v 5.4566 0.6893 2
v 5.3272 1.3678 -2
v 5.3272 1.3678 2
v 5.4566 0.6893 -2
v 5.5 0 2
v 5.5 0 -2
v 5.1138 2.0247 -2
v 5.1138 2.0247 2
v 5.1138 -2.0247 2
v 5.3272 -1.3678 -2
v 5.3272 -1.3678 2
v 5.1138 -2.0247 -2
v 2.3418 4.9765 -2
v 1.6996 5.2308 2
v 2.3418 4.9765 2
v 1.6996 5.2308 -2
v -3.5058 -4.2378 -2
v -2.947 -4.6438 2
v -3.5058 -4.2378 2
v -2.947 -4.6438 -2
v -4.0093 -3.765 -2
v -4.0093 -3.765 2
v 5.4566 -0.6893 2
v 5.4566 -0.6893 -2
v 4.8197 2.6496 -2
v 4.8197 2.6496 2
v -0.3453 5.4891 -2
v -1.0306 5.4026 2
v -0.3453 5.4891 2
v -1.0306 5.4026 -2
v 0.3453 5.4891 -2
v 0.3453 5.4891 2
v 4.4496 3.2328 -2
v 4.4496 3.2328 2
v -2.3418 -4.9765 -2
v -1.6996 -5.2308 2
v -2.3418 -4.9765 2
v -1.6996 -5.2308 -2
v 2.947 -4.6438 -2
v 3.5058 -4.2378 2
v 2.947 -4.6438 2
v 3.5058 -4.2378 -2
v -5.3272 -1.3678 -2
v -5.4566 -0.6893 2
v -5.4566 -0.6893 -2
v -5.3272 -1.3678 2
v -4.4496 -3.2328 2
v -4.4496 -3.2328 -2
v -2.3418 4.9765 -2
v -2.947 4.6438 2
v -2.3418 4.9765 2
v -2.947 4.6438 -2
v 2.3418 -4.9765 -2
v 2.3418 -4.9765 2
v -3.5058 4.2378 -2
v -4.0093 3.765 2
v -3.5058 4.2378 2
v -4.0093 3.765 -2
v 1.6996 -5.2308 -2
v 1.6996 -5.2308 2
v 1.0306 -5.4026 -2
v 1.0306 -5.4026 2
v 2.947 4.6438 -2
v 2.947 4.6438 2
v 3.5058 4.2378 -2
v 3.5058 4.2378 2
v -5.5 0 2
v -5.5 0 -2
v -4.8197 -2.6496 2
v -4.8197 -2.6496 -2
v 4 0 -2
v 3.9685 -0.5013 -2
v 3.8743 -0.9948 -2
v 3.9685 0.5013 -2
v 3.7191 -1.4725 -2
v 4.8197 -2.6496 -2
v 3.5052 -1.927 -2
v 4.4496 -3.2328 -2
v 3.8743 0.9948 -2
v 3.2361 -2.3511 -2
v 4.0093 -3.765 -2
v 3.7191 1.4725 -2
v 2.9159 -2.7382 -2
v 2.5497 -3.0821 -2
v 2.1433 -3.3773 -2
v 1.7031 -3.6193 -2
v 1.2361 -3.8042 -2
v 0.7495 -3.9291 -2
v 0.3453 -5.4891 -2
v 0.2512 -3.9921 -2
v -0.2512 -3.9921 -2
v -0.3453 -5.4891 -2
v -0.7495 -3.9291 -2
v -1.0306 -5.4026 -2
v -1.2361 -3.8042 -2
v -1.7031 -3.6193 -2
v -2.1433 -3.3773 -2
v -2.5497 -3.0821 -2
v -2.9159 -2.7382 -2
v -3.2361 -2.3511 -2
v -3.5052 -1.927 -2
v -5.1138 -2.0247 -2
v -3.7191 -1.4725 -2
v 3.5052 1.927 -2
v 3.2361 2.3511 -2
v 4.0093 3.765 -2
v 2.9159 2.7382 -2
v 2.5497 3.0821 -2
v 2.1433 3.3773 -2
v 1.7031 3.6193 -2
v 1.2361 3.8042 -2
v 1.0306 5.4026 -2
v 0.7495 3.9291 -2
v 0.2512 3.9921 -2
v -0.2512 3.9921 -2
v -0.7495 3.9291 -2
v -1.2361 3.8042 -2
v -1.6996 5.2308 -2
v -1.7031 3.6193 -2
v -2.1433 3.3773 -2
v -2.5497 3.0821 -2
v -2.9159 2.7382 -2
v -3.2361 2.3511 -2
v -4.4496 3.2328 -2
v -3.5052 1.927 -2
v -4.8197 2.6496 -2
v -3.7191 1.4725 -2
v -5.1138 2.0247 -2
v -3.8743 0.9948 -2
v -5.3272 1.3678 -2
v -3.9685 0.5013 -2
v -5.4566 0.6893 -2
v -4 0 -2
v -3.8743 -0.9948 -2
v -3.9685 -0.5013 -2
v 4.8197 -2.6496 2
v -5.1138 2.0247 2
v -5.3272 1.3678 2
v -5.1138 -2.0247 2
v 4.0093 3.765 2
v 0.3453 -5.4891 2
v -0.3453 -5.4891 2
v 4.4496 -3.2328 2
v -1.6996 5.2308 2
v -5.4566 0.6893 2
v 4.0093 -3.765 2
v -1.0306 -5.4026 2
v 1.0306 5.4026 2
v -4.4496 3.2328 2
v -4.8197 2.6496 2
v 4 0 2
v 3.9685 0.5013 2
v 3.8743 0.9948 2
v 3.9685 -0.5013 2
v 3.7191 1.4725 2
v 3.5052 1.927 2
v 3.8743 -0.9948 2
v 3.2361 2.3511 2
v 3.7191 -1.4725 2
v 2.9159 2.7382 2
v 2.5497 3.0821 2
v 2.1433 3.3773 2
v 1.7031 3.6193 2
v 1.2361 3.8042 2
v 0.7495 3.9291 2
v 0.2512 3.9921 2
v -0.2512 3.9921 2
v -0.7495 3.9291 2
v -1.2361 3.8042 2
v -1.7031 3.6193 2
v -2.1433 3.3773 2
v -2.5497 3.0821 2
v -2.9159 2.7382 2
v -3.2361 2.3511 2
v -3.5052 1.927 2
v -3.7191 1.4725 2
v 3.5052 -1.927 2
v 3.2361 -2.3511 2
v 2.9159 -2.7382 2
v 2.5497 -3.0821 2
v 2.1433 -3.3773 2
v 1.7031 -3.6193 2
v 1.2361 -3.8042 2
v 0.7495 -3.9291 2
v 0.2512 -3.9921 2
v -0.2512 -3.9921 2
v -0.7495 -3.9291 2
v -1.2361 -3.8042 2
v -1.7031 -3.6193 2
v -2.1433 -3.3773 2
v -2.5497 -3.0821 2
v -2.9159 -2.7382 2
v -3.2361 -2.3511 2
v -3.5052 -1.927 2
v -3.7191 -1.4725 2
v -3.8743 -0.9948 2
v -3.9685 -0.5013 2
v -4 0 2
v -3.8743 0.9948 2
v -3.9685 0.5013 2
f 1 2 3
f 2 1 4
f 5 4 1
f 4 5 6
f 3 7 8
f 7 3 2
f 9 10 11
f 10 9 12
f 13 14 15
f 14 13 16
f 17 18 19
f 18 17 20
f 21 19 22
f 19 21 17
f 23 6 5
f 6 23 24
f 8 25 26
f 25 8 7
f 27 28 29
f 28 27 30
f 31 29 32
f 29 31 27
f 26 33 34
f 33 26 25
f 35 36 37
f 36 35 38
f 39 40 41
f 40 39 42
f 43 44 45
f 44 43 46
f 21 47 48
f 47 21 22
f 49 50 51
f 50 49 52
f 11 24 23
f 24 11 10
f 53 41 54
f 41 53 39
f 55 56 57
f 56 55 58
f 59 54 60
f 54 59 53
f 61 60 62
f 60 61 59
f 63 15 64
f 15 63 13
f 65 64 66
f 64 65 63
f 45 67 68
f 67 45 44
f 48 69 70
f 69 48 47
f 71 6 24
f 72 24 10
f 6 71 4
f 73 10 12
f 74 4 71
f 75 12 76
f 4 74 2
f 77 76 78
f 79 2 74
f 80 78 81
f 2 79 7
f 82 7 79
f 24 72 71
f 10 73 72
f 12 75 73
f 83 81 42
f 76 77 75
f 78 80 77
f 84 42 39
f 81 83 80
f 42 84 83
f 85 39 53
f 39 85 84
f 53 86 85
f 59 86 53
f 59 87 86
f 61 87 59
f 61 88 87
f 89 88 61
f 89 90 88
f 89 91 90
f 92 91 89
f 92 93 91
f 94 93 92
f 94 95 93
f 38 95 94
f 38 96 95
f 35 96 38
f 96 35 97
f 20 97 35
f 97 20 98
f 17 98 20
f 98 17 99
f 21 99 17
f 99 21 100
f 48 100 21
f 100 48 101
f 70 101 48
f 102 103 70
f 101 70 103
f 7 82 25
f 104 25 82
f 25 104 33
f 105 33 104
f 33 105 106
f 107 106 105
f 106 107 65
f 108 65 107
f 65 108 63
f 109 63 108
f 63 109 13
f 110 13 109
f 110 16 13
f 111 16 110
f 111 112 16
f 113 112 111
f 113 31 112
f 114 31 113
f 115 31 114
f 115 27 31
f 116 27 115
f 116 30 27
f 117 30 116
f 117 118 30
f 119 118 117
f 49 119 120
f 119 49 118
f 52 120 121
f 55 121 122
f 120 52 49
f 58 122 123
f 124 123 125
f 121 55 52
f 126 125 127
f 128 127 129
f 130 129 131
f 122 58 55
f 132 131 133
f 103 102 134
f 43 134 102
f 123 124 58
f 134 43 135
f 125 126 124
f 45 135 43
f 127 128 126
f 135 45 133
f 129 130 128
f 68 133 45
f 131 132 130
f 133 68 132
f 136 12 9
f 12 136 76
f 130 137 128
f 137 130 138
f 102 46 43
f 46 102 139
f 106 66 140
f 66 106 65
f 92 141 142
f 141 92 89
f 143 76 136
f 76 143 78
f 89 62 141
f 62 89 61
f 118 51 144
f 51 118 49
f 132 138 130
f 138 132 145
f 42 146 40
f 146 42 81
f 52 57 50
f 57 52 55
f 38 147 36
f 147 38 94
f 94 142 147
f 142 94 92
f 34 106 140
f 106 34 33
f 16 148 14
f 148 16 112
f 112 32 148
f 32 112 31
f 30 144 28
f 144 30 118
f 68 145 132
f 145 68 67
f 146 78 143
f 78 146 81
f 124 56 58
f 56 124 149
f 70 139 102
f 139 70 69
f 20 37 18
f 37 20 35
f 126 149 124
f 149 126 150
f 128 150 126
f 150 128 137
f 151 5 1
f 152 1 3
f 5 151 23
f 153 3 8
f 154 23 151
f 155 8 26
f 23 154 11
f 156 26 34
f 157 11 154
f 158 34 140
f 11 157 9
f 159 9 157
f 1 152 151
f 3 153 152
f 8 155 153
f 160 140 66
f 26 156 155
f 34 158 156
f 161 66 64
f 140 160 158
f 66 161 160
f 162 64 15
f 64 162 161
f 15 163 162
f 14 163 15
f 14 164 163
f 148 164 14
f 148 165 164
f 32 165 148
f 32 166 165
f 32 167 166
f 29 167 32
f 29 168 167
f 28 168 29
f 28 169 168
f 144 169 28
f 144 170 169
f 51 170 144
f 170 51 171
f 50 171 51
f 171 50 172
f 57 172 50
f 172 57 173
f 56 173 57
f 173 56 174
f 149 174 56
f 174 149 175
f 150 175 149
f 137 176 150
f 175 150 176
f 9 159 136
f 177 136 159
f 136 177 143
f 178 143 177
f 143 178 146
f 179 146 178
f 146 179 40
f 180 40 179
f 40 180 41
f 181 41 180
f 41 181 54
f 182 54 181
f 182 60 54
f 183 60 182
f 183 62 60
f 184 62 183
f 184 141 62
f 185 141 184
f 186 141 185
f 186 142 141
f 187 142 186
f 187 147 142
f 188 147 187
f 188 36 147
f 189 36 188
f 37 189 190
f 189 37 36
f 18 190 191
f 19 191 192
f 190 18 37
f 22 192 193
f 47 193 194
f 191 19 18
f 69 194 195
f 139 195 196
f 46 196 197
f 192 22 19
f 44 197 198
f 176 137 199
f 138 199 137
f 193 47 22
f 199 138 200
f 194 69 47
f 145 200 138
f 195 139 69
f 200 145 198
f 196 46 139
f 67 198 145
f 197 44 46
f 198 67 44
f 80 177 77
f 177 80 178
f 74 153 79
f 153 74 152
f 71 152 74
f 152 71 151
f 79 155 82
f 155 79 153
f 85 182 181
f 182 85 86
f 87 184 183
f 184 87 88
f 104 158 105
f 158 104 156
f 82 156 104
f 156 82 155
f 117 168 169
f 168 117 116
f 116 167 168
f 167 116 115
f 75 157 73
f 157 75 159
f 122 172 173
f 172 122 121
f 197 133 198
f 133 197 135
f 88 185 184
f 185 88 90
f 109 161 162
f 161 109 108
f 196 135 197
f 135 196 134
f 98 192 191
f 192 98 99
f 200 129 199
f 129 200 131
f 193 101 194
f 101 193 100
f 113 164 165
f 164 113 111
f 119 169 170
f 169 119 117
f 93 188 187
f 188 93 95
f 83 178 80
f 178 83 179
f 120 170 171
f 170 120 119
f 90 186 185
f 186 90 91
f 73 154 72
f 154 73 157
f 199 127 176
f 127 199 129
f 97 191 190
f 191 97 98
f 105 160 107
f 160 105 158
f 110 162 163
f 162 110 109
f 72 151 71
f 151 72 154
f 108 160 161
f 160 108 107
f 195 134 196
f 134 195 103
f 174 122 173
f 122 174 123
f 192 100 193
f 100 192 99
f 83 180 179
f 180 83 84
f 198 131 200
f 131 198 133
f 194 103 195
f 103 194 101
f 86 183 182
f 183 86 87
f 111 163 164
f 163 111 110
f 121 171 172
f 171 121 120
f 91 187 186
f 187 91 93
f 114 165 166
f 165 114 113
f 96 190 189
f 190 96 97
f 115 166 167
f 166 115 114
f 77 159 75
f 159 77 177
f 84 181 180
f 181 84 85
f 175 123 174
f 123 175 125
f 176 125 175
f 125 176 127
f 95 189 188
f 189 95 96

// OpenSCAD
$fn = 50;


difference() {
	union() {
		translate(v = [0, 0, -2.0000000000]) {
			cylinder(h = 4, r = 5.5000000000);
		}
	}
	union() {
		translate(v = [0, 0, -100.0000000000]) {
			cylinder(h = 200, r = 4.0000000000);
		}
	}
}
